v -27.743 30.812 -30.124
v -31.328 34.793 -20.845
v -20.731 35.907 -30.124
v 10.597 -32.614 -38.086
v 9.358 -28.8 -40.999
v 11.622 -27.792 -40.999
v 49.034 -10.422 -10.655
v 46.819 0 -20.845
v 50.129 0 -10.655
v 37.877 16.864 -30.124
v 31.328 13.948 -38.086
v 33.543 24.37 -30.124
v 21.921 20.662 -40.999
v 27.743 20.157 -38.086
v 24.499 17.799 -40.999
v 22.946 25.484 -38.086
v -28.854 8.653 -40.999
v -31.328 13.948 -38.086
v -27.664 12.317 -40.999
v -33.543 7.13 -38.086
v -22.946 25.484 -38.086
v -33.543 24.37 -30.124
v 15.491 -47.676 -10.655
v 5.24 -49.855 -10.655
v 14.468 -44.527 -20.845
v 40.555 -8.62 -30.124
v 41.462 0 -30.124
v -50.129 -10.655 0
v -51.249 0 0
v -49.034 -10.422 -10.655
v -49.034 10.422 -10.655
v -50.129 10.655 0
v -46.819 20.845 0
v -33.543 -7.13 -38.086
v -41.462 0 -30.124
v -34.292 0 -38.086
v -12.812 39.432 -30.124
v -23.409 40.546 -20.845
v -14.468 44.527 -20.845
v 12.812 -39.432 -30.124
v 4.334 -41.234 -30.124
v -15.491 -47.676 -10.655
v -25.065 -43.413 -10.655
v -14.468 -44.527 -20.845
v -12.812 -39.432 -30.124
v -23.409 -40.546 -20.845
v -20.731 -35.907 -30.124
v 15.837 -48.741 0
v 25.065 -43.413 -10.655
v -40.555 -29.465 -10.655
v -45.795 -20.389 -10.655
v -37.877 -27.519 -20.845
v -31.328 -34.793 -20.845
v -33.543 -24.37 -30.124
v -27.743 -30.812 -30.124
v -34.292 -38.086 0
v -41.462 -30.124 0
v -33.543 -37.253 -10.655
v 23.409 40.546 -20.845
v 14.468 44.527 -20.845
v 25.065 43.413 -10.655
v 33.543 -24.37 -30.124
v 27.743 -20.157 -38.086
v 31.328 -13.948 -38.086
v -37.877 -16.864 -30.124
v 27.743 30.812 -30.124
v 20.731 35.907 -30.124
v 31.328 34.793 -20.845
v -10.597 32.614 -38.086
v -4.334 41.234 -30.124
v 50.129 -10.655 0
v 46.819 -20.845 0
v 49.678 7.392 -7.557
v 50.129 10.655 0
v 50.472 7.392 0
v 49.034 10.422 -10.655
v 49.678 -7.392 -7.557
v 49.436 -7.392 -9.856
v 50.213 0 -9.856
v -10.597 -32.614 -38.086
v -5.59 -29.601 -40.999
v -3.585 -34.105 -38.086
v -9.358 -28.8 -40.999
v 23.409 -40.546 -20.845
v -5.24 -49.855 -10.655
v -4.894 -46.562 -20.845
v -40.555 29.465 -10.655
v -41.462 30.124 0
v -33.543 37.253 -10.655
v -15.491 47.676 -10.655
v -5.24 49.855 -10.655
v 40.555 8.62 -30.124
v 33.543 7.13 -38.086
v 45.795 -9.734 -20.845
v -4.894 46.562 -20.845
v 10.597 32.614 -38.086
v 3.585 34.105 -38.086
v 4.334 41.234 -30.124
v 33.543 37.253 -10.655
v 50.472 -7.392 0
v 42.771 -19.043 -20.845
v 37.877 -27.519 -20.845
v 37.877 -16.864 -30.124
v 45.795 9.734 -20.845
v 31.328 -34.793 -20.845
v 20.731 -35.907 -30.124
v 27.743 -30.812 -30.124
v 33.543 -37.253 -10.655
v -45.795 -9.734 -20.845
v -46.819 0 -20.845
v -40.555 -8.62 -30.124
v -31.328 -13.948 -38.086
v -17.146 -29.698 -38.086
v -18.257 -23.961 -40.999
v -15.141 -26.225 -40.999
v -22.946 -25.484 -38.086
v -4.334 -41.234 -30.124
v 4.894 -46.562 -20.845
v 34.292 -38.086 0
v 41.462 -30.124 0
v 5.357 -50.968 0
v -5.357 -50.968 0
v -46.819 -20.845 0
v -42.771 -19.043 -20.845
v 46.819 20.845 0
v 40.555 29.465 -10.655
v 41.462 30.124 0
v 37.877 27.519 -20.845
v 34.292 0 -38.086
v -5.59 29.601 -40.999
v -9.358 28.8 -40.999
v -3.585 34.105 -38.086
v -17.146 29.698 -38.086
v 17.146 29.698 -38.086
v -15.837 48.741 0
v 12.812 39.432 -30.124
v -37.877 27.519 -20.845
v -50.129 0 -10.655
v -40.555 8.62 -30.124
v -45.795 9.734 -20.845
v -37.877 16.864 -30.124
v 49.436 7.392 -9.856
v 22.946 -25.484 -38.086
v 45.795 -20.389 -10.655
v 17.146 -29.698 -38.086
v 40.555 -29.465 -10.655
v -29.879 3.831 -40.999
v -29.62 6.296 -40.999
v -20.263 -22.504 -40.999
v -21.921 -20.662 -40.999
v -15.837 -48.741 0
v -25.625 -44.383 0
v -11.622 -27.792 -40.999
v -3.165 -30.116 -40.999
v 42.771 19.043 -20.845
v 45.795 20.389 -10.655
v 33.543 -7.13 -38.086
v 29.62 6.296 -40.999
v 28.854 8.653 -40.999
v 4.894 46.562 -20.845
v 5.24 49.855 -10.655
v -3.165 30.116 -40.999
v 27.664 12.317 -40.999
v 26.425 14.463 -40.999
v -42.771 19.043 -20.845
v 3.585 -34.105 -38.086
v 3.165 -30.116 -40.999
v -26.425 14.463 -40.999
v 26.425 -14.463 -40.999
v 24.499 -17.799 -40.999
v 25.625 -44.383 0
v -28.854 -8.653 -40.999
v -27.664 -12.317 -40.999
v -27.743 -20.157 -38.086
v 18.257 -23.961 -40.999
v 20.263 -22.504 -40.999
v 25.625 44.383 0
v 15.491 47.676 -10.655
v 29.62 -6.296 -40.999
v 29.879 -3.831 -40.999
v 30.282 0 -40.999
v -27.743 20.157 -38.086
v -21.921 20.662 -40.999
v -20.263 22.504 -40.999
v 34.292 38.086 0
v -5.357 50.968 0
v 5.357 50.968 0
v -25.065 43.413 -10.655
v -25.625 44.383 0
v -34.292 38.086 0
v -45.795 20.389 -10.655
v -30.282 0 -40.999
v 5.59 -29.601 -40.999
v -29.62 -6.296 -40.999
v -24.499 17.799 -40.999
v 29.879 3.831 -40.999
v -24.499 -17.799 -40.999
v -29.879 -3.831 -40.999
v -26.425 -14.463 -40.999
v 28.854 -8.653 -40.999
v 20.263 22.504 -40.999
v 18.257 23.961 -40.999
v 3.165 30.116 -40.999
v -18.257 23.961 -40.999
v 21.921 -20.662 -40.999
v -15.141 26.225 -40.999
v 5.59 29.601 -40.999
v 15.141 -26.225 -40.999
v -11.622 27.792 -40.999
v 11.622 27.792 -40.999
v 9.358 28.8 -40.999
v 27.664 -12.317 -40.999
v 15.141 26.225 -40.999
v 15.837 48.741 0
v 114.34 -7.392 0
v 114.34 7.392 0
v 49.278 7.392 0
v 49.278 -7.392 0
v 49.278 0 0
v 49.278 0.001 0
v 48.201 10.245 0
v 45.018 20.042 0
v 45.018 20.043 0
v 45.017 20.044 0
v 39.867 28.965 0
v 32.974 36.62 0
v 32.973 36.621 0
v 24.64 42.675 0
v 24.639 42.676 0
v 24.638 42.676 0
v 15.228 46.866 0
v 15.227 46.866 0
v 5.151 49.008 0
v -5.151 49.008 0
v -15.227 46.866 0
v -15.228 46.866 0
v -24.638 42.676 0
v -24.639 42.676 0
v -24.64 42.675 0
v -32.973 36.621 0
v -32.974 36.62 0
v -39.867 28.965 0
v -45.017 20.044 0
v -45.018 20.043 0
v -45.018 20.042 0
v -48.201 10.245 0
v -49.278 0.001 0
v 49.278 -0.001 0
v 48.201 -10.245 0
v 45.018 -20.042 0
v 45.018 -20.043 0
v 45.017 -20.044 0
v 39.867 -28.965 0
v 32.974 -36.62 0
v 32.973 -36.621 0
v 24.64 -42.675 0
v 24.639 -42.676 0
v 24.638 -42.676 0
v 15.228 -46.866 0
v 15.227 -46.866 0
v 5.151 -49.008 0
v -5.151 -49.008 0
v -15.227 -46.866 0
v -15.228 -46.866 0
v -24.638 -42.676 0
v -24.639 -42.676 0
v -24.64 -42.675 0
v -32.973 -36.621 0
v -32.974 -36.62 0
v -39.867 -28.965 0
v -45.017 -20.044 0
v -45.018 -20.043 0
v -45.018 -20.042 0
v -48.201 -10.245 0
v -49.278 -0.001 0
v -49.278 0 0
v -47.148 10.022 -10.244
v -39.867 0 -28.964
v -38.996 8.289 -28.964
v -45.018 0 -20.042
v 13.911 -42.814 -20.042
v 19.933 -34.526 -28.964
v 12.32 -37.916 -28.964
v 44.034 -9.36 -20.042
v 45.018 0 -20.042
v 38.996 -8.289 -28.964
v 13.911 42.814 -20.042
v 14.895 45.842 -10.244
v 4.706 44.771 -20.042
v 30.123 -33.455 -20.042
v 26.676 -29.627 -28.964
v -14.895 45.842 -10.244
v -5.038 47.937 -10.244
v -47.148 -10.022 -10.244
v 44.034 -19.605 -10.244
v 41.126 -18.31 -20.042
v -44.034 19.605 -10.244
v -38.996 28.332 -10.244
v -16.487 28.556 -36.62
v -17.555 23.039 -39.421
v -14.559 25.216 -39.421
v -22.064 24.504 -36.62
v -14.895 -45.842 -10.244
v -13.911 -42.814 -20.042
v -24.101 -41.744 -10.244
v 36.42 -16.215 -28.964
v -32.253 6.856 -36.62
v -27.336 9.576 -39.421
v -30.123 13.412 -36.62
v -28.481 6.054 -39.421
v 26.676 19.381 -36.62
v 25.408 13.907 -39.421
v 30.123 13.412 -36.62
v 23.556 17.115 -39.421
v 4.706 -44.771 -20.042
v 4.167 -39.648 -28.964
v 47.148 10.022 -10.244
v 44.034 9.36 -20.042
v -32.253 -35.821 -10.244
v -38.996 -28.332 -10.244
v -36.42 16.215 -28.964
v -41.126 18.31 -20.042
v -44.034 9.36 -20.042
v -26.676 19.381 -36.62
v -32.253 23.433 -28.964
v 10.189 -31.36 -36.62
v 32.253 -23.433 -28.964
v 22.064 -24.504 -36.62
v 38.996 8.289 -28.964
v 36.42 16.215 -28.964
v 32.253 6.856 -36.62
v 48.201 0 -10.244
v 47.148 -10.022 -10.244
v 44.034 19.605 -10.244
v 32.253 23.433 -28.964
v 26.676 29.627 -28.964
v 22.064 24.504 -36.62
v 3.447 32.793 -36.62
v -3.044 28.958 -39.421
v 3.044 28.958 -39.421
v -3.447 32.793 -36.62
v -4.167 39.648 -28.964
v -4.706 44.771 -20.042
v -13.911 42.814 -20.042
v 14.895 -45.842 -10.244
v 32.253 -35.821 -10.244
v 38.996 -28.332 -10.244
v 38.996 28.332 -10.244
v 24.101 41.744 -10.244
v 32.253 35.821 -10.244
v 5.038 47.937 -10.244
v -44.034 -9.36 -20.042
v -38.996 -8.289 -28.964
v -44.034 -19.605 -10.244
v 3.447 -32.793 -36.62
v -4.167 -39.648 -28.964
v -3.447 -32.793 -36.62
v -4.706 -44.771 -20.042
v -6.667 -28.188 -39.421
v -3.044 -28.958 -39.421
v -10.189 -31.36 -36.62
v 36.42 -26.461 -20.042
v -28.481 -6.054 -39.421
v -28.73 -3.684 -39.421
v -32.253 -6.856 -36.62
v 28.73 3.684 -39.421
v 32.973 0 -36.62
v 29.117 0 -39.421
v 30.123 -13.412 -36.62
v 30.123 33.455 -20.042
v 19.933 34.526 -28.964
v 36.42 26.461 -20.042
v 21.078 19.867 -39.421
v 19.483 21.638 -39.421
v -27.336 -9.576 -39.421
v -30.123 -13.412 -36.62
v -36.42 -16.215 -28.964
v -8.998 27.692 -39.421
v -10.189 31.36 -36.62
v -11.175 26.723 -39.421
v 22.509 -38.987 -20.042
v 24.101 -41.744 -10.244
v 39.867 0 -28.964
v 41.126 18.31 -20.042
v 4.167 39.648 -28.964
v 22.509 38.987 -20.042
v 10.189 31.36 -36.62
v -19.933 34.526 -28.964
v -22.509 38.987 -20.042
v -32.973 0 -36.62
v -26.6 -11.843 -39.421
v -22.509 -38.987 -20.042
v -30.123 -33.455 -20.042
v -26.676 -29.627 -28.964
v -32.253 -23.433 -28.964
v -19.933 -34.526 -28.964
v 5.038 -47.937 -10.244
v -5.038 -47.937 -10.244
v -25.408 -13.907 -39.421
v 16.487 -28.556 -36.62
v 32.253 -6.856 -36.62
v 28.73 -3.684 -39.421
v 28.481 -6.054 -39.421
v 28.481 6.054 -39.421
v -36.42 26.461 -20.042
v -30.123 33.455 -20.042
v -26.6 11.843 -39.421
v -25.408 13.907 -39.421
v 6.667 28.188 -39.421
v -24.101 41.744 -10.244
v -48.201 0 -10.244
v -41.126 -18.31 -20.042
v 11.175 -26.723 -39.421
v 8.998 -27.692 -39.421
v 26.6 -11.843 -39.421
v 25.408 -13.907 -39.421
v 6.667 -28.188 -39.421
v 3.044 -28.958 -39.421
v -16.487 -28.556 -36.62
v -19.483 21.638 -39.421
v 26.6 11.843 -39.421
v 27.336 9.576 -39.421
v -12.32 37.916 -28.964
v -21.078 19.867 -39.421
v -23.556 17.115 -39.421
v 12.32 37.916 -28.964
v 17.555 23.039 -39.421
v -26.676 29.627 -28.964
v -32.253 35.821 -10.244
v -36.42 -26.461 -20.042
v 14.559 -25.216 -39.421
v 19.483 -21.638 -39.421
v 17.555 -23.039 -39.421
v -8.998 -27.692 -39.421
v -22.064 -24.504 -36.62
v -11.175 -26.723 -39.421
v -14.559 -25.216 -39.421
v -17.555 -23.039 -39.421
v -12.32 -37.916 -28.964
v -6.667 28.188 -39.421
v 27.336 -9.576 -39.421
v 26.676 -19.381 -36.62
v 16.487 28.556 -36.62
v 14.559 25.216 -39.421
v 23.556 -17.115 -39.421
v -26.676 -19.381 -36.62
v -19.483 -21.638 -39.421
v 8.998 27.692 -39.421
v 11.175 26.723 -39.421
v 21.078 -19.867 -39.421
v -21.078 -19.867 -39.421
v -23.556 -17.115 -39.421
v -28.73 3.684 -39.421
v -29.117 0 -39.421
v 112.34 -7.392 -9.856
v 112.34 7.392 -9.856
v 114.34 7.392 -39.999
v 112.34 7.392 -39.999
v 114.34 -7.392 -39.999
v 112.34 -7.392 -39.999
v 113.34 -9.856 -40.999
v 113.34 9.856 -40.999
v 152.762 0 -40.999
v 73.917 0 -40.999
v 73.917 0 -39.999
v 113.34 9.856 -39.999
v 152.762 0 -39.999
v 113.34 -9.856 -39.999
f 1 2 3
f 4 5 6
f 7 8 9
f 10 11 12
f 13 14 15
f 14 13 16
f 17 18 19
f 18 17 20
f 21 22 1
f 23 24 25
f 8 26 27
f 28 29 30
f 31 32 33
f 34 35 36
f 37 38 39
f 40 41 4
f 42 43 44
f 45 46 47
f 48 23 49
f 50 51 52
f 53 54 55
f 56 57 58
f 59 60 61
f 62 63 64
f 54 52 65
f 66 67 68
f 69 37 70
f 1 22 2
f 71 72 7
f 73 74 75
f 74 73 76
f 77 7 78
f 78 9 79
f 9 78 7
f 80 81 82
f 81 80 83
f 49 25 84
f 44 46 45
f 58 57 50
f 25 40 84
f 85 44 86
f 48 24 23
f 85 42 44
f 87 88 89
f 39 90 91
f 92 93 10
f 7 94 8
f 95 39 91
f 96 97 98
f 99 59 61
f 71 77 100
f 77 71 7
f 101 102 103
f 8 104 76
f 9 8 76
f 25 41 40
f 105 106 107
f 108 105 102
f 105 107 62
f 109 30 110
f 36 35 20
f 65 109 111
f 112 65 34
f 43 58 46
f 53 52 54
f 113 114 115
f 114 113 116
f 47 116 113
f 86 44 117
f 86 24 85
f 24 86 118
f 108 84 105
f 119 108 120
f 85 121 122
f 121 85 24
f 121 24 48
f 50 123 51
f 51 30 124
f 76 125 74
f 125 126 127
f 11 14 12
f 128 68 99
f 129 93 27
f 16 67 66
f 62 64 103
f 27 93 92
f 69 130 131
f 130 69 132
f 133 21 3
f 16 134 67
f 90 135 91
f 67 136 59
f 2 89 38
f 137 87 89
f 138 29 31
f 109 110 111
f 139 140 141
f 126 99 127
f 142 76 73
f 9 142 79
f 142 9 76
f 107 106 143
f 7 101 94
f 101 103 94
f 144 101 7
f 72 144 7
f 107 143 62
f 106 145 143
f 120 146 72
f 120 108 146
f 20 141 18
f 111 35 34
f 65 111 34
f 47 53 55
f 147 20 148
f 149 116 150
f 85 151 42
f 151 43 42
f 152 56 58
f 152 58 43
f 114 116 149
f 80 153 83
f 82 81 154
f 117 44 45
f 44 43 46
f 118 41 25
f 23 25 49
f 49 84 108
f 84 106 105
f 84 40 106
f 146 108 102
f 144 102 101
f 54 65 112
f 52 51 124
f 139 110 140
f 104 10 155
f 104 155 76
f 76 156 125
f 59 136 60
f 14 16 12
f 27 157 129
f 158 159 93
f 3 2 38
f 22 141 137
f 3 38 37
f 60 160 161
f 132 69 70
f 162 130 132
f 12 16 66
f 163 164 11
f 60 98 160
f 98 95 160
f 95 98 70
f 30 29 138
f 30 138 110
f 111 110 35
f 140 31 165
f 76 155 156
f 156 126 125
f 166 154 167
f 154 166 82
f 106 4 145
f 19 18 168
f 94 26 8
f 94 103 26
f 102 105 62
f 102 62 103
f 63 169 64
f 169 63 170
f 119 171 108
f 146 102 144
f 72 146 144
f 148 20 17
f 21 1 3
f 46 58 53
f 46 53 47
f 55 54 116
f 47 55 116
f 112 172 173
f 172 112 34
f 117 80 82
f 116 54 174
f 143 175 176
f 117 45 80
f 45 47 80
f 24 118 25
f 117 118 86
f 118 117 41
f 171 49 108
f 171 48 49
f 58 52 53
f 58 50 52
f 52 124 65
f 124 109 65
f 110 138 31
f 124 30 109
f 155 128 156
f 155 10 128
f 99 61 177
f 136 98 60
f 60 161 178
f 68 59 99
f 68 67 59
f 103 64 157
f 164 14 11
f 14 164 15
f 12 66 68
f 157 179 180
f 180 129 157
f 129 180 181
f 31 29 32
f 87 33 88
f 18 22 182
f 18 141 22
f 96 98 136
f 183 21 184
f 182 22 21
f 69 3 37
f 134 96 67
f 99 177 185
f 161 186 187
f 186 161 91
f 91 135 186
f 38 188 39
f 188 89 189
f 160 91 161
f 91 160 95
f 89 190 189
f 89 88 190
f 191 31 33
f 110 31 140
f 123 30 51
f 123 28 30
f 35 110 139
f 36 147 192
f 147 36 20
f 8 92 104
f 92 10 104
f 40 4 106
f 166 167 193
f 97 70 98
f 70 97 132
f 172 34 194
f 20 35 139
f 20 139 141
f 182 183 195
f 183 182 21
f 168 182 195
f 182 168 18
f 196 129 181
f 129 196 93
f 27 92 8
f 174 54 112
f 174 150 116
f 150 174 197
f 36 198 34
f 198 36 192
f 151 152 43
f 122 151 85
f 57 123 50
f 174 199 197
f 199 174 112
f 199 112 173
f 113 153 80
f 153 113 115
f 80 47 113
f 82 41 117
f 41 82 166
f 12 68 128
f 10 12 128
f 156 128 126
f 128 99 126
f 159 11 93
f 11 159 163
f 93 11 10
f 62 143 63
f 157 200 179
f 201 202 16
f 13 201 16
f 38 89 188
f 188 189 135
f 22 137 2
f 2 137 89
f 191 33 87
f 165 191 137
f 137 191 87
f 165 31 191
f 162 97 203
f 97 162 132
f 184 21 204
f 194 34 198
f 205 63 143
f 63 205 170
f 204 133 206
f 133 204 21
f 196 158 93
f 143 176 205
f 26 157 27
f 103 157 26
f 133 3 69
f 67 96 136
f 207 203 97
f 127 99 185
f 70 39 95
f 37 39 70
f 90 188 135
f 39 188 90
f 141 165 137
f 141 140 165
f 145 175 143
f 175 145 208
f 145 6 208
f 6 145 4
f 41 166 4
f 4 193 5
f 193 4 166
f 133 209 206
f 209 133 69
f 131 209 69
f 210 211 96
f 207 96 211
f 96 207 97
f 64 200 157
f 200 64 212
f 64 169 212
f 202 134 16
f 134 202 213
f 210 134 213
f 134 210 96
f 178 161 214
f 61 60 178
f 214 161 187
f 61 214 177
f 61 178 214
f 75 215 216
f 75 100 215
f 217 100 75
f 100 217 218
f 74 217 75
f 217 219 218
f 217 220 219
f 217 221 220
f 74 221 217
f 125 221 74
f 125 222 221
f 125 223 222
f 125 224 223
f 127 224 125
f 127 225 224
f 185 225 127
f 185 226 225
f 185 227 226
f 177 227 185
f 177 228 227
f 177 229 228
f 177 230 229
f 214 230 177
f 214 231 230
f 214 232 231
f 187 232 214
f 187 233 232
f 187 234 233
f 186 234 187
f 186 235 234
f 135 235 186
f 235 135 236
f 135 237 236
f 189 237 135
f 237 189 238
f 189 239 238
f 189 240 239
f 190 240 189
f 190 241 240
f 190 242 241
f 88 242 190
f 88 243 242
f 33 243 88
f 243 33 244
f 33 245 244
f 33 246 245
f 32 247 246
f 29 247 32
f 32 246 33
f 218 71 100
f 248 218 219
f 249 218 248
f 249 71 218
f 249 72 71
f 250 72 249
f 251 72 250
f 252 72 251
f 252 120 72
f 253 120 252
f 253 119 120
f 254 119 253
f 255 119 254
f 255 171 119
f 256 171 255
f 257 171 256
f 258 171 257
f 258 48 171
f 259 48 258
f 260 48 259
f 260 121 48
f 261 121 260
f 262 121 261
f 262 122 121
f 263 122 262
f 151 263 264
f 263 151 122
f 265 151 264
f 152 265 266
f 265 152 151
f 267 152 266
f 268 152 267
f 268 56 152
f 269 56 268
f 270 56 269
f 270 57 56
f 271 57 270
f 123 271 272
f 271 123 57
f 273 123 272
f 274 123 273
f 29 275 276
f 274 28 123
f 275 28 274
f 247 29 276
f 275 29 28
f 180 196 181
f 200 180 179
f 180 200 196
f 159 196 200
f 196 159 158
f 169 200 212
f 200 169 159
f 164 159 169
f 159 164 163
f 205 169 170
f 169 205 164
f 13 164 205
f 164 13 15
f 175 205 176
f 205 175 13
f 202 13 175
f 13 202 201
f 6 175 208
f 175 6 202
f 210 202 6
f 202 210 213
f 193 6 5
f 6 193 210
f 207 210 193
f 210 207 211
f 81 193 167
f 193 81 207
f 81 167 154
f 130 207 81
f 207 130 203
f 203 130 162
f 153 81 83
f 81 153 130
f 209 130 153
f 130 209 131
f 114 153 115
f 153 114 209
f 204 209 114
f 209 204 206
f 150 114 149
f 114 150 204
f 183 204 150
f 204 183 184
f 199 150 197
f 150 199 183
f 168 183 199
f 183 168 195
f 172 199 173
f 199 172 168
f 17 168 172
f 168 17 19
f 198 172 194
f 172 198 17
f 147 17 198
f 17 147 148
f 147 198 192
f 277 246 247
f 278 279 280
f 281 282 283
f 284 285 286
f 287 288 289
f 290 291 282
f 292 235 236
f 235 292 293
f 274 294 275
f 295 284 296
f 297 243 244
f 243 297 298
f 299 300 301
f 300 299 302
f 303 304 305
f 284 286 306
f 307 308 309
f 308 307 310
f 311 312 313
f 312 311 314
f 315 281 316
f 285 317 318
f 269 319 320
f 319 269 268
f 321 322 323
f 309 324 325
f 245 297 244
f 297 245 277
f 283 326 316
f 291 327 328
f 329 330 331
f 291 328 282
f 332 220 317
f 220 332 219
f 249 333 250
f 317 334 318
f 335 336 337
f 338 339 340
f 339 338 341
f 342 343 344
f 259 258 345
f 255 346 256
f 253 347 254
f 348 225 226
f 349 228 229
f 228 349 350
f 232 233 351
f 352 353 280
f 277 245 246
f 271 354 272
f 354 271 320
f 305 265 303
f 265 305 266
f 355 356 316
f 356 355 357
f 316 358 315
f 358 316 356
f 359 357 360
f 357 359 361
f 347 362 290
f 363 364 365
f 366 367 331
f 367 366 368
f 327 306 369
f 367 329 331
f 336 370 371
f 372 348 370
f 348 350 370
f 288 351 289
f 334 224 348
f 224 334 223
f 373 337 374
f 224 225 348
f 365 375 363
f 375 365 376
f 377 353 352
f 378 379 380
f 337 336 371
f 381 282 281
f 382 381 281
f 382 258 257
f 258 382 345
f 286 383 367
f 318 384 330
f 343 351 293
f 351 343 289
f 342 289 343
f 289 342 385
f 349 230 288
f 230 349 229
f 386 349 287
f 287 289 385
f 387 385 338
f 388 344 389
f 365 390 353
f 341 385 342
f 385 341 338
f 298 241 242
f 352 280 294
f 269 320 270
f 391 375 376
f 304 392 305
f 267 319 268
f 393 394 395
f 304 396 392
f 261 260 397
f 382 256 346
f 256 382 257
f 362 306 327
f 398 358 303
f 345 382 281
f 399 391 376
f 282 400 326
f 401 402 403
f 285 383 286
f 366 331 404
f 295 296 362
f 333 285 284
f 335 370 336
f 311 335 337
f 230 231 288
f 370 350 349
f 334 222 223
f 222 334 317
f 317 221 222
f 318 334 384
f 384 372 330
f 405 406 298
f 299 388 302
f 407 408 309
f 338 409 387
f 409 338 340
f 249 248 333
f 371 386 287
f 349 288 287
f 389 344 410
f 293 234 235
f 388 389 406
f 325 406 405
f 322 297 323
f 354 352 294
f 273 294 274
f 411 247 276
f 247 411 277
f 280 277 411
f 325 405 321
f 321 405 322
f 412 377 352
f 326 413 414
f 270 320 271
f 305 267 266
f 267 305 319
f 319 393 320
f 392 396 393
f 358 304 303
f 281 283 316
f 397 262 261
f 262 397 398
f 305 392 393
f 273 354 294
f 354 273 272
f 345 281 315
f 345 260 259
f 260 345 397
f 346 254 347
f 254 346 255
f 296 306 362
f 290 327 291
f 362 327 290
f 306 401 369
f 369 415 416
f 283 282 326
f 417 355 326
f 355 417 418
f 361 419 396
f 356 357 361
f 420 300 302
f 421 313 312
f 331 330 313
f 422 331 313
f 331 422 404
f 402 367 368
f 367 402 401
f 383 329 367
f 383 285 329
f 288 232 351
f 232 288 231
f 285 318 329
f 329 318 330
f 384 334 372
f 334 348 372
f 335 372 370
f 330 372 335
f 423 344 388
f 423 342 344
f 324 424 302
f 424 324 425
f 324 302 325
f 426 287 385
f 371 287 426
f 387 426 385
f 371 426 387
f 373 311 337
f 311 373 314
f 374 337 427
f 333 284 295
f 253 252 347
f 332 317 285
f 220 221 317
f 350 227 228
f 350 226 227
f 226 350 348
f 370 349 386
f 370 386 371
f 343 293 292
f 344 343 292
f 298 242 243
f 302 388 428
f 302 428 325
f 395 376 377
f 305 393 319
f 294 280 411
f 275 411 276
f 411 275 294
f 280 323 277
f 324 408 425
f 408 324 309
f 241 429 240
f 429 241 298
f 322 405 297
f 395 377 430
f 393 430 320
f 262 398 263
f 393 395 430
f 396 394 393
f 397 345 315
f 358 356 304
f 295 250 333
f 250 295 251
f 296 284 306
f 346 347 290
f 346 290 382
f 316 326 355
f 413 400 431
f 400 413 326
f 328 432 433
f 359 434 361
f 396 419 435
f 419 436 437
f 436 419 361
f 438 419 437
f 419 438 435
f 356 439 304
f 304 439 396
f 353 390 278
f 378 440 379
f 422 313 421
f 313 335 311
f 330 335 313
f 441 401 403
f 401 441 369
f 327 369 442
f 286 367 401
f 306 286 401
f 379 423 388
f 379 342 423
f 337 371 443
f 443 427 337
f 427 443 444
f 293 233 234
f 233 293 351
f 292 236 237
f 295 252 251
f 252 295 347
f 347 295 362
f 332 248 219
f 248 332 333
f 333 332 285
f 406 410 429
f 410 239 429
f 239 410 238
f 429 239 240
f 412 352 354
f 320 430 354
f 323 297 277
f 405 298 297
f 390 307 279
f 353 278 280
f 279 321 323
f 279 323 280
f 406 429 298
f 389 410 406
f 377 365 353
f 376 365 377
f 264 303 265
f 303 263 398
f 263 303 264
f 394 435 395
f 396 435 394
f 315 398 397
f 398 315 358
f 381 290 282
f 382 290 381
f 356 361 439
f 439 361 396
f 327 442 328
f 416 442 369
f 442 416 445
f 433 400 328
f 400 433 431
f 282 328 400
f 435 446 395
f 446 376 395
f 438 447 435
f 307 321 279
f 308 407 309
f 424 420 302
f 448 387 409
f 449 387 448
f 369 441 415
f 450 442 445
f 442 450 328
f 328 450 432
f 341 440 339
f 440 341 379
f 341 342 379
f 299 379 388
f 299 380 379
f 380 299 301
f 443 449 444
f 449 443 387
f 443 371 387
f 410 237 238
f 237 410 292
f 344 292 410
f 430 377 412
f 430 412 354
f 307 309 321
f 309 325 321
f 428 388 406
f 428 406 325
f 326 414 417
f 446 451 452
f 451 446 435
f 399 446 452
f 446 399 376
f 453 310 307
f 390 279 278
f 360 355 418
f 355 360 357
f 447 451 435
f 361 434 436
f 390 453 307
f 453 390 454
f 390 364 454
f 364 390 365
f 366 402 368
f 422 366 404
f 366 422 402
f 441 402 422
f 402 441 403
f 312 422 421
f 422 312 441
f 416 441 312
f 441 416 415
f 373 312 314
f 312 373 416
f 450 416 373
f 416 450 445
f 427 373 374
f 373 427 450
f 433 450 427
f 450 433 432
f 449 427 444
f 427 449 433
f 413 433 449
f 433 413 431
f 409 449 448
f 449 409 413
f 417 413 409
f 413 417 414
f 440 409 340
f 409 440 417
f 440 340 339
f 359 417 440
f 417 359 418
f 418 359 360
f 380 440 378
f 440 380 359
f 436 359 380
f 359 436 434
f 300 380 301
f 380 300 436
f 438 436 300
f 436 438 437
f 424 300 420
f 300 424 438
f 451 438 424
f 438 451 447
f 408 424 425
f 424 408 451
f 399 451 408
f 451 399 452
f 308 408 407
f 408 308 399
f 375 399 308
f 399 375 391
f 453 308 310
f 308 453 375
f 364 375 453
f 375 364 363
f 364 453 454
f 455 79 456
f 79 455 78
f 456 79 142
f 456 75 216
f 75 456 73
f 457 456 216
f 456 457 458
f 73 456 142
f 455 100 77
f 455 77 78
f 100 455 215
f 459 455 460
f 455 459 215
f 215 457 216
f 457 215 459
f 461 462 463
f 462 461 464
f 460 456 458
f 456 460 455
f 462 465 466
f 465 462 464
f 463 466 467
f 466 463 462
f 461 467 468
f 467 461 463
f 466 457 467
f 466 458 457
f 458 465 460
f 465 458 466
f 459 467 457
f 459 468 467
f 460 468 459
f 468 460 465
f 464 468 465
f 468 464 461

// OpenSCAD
//Volume in mL or CC.
volume=236.588;

wallThick=1.04; // [1.04:1.20]

//Who says it has to stay the same...
pi=3.1415926536;
radius=10*pow((volume*375)/(236*pi),1/3);

handlX=1.3*radius;
handlY=0.3*radius;
handlZ=0.2*radius;

//Resolution
res=30;

echo("volume: " );echo(volume);
echo("height: " );echo(4*radius/5);
echo("radius: ");echo(radius);
echo("thickness: ");echo(radius*(wallThick-1));

module cup(r)
{

	difference()
	{
	sphere(r,$fn=res);
	translate([0,0,(r+1)])cube(2*(r+1),true);

	translate([0,0,-(r+1)-4*r/5])cube(2*(r+1),true);
	}
}

difference()
{
cup(radius*wallThick);
translate([0,0,0.001])cup(radius);	
}

translate([(handlX/2)+radius,0,-handlZ/2])cube([handlX,handlY,handlZ],true);
translate([(handlX/2)+radius+handlX/2,0,-(4*radius*wallThick/5)/2])cube([2,handlY,(4*radius*wallThick/5)],true);
translate([(handlX/2)+radius+handlX/2,0,-(4*radius*wallThick/5)])scale([4,1,1])cylinder(r=2*handlY/3,h=1,$fn=4);
